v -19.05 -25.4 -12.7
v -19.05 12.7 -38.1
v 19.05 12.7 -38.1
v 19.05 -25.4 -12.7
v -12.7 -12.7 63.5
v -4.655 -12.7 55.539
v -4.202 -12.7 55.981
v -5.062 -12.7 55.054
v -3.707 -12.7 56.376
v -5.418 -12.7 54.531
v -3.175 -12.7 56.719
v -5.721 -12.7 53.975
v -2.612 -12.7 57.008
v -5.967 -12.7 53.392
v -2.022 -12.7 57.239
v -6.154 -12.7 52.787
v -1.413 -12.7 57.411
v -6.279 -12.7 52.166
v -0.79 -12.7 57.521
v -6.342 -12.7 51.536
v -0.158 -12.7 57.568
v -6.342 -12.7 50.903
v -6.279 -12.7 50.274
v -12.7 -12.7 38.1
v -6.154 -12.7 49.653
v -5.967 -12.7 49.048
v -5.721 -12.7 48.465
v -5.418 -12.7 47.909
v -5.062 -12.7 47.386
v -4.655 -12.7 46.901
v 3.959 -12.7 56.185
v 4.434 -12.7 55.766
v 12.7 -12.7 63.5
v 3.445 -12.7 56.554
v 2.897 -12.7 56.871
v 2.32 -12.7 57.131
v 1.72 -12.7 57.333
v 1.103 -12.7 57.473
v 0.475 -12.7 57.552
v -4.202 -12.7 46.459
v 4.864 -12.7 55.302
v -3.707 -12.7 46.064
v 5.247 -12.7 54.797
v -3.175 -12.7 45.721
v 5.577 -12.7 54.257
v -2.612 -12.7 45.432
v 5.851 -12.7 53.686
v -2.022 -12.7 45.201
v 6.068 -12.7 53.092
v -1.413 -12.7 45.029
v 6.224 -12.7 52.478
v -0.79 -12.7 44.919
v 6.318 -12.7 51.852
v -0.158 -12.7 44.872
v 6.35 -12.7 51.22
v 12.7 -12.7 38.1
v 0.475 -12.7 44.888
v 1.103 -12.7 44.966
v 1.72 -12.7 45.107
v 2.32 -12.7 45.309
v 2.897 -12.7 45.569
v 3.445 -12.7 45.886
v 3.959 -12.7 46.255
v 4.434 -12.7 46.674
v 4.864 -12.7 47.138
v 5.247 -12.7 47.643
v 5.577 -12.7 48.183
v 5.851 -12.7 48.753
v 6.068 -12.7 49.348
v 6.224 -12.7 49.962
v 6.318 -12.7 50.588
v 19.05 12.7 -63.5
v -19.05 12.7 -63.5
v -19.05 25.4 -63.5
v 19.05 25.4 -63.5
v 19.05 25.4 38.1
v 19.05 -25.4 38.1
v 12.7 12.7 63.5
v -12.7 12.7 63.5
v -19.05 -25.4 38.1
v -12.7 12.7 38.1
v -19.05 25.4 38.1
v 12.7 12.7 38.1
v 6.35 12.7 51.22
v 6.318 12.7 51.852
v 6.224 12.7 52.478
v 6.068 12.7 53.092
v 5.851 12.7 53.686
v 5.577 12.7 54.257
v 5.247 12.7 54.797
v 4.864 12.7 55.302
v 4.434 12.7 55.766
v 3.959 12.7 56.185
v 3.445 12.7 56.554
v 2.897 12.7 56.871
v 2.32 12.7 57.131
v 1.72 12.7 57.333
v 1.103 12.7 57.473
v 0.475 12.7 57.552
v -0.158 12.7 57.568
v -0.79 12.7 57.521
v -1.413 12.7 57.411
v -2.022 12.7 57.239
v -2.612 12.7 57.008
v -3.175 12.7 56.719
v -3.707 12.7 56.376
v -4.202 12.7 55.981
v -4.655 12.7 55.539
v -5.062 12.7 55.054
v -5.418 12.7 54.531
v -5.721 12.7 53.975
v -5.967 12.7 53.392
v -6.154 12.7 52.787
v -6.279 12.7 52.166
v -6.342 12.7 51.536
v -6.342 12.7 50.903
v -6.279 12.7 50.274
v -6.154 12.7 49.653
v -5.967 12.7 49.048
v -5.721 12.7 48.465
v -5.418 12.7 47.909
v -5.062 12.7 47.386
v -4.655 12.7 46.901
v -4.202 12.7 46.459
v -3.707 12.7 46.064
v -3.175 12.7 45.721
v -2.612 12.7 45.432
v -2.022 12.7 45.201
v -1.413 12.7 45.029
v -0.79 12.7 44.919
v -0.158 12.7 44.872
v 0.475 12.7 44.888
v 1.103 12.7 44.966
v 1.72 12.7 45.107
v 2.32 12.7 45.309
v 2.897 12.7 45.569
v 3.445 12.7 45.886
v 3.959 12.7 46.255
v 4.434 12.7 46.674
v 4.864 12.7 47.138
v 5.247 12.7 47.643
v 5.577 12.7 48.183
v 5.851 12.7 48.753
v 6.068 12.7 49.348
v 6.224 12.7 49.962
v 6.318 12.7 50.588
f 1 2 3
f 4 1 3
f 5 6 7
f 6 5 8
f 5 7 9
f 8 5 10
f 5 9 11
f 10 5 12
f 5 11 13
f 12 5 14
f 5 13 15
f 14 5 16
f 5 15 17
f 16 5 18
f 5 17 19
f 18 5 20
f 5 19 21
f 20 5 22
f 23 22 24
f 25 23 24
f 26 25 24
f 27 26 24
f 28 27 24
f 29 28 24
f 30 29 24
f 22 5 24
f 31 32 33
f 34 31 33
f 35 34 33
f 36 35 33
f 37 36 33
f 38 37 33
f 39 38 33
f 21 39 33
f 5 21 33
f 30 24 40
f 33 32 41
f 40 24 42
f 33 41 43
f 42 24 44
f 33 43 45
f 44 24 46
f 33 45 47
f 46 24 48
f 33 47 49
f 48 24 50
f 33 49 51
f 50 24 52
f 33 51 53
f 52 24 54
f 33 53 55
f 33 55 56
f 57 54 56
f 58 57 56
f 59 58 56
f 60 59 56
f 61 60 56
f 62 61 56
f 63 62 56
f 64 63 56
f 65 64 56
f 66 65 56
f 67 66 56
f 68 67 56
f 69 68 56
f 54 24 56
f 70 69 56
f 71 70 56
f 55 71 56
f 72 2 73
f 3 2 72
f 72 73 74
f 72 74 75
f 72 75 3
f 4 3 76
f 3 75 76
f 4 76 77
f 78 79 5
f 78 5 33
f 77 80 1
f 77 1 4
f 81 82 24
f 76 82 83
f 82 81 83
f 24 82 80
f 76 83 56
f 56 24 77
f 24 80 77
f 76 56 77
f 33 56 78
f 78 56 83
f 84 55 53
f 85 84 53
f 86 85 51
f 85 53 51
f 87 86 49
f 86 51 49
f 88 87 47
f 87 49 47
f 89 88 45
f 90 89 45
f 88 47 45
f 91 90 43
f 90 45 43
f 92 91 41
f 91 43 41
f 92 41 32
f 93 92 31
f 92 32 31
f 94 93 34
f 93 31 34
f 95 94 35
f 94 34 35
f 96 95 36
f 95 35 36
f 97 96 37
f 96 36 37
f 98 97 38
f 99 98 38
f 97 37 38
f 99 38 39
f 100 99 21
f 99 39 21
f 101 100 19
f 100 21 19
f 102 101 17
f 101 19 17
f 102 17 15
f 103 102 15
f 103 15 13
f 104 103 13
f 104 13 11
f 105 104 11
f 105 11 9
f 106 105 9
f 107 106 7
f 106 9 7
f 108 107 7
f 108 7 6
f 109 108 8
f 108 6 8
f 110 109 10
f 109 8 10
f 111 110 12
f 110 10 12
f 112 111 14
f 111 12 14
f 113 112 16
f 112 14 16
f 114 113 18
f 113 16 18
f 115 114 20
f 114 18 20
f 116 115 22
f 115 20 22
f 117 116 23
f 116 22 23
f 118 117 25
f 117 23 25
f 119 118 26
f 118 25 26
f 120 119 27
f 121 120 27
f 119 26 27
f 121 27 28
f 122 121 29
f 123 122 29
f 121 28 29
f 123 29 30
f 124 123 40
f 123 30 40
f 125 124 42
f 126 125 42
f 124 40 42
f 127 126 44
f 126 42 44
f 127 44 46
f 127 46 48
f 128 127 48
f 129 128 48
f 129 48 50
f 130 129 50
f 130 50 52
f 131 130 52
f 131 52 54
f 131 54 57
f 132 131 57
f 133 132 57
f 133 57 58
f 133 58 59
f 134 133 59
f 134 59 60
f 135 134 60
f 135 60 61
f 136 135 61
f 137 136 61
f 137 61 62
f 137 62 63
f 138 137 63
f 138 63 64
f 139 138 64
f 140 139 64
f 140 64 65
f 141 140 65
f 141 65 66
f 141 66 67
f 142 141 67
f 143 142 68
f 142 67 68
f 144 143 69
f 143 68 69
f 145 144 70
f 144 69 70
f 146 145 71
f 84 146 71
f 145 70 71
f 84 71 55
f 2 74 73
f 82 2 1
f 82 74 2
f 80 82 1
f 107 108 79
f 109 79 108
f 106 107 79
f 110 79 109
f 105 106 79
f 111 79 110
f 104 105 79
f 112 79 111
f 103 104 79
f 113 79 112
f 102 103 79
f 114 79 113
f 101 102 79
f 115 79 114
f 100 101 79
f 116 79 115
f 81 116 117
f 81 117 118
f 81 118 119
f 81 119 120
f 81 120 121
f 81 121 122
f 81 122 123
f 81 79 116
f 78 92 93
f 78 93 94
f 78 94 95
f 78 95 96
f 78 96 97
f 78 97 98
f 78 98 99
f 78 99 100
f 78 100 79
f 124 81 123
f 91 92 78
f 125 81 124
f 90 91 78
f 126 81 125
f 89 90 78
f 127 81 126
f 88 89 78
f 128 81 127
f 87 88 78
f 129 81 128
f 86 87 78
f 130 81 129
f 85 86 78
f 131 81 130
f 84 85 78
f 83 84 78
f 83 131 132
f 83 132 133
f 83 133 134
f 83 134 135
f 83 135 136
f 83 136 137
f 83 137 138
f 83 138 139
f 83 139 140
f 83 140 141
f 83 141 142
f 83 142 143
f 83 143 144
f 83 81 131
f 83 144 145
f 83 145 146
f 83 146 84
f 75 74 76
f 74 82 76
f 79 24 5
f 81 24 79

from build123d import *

# Parameters (mm, degrees)
F0_W     = 38.1
F0_H     = 76.2
F1_DEPTH = 25.4
F2_SIZE2 = 38.1
F2_SIZE  = 25.4
F3_W     = 25.4
F3_H     = 25.4
F4_DEPTH = 25.4
F5_R     = 6.35
F6_DEPTH = 25.4
F7_W     = 38.1
F7_H     = 12.7
F8_DEPTH = 25.4


with BuildPart() as f1:
    # F0 (on Front) → F1 (new body, symmetric)
    with BuildSketch(Plane.XZ):
        Rectangle(F0_W, F0_H)
    extrude(amount=F1_DEPTH, both=True)

    # F2
    f2_edges = [f1.edges().sort_by_distance(p)[0] for p in [
        (0, -25.4, -38.1),
    ]]
    chamfer(f2_edges, length=F2_SIZE, length2=F2_SIZE2)

    # F3 (on face) → F4 (join)
    with BuildSketch(Plane.XY.offset(38.1)):
        Rectangle(F3_W, F3_H)
    extrude(amount=F4_DEPTH)

    # F5 (on face) → F6 (cut)
    with BuildSketch(Plane.XZ.offset(12.7)):
        with Locations((0, 51.219936)):
            Circle(F5_R)
    extrude(amount=-F6_DEPTH, mode=Mode.SUBTRACT)

    # F7 (on face) → F8 (join)
    with BuildSketch(Plane(origin=(0, 0, -38.1), x_dir=(1, 0, 0), z_dir=(0, 0, -1))):
        with Locations((0, -19.05)):
            Rectangle(F7_W, F7_H)
    extrude(amount=F8_DEPTH)


solid = f1.part
